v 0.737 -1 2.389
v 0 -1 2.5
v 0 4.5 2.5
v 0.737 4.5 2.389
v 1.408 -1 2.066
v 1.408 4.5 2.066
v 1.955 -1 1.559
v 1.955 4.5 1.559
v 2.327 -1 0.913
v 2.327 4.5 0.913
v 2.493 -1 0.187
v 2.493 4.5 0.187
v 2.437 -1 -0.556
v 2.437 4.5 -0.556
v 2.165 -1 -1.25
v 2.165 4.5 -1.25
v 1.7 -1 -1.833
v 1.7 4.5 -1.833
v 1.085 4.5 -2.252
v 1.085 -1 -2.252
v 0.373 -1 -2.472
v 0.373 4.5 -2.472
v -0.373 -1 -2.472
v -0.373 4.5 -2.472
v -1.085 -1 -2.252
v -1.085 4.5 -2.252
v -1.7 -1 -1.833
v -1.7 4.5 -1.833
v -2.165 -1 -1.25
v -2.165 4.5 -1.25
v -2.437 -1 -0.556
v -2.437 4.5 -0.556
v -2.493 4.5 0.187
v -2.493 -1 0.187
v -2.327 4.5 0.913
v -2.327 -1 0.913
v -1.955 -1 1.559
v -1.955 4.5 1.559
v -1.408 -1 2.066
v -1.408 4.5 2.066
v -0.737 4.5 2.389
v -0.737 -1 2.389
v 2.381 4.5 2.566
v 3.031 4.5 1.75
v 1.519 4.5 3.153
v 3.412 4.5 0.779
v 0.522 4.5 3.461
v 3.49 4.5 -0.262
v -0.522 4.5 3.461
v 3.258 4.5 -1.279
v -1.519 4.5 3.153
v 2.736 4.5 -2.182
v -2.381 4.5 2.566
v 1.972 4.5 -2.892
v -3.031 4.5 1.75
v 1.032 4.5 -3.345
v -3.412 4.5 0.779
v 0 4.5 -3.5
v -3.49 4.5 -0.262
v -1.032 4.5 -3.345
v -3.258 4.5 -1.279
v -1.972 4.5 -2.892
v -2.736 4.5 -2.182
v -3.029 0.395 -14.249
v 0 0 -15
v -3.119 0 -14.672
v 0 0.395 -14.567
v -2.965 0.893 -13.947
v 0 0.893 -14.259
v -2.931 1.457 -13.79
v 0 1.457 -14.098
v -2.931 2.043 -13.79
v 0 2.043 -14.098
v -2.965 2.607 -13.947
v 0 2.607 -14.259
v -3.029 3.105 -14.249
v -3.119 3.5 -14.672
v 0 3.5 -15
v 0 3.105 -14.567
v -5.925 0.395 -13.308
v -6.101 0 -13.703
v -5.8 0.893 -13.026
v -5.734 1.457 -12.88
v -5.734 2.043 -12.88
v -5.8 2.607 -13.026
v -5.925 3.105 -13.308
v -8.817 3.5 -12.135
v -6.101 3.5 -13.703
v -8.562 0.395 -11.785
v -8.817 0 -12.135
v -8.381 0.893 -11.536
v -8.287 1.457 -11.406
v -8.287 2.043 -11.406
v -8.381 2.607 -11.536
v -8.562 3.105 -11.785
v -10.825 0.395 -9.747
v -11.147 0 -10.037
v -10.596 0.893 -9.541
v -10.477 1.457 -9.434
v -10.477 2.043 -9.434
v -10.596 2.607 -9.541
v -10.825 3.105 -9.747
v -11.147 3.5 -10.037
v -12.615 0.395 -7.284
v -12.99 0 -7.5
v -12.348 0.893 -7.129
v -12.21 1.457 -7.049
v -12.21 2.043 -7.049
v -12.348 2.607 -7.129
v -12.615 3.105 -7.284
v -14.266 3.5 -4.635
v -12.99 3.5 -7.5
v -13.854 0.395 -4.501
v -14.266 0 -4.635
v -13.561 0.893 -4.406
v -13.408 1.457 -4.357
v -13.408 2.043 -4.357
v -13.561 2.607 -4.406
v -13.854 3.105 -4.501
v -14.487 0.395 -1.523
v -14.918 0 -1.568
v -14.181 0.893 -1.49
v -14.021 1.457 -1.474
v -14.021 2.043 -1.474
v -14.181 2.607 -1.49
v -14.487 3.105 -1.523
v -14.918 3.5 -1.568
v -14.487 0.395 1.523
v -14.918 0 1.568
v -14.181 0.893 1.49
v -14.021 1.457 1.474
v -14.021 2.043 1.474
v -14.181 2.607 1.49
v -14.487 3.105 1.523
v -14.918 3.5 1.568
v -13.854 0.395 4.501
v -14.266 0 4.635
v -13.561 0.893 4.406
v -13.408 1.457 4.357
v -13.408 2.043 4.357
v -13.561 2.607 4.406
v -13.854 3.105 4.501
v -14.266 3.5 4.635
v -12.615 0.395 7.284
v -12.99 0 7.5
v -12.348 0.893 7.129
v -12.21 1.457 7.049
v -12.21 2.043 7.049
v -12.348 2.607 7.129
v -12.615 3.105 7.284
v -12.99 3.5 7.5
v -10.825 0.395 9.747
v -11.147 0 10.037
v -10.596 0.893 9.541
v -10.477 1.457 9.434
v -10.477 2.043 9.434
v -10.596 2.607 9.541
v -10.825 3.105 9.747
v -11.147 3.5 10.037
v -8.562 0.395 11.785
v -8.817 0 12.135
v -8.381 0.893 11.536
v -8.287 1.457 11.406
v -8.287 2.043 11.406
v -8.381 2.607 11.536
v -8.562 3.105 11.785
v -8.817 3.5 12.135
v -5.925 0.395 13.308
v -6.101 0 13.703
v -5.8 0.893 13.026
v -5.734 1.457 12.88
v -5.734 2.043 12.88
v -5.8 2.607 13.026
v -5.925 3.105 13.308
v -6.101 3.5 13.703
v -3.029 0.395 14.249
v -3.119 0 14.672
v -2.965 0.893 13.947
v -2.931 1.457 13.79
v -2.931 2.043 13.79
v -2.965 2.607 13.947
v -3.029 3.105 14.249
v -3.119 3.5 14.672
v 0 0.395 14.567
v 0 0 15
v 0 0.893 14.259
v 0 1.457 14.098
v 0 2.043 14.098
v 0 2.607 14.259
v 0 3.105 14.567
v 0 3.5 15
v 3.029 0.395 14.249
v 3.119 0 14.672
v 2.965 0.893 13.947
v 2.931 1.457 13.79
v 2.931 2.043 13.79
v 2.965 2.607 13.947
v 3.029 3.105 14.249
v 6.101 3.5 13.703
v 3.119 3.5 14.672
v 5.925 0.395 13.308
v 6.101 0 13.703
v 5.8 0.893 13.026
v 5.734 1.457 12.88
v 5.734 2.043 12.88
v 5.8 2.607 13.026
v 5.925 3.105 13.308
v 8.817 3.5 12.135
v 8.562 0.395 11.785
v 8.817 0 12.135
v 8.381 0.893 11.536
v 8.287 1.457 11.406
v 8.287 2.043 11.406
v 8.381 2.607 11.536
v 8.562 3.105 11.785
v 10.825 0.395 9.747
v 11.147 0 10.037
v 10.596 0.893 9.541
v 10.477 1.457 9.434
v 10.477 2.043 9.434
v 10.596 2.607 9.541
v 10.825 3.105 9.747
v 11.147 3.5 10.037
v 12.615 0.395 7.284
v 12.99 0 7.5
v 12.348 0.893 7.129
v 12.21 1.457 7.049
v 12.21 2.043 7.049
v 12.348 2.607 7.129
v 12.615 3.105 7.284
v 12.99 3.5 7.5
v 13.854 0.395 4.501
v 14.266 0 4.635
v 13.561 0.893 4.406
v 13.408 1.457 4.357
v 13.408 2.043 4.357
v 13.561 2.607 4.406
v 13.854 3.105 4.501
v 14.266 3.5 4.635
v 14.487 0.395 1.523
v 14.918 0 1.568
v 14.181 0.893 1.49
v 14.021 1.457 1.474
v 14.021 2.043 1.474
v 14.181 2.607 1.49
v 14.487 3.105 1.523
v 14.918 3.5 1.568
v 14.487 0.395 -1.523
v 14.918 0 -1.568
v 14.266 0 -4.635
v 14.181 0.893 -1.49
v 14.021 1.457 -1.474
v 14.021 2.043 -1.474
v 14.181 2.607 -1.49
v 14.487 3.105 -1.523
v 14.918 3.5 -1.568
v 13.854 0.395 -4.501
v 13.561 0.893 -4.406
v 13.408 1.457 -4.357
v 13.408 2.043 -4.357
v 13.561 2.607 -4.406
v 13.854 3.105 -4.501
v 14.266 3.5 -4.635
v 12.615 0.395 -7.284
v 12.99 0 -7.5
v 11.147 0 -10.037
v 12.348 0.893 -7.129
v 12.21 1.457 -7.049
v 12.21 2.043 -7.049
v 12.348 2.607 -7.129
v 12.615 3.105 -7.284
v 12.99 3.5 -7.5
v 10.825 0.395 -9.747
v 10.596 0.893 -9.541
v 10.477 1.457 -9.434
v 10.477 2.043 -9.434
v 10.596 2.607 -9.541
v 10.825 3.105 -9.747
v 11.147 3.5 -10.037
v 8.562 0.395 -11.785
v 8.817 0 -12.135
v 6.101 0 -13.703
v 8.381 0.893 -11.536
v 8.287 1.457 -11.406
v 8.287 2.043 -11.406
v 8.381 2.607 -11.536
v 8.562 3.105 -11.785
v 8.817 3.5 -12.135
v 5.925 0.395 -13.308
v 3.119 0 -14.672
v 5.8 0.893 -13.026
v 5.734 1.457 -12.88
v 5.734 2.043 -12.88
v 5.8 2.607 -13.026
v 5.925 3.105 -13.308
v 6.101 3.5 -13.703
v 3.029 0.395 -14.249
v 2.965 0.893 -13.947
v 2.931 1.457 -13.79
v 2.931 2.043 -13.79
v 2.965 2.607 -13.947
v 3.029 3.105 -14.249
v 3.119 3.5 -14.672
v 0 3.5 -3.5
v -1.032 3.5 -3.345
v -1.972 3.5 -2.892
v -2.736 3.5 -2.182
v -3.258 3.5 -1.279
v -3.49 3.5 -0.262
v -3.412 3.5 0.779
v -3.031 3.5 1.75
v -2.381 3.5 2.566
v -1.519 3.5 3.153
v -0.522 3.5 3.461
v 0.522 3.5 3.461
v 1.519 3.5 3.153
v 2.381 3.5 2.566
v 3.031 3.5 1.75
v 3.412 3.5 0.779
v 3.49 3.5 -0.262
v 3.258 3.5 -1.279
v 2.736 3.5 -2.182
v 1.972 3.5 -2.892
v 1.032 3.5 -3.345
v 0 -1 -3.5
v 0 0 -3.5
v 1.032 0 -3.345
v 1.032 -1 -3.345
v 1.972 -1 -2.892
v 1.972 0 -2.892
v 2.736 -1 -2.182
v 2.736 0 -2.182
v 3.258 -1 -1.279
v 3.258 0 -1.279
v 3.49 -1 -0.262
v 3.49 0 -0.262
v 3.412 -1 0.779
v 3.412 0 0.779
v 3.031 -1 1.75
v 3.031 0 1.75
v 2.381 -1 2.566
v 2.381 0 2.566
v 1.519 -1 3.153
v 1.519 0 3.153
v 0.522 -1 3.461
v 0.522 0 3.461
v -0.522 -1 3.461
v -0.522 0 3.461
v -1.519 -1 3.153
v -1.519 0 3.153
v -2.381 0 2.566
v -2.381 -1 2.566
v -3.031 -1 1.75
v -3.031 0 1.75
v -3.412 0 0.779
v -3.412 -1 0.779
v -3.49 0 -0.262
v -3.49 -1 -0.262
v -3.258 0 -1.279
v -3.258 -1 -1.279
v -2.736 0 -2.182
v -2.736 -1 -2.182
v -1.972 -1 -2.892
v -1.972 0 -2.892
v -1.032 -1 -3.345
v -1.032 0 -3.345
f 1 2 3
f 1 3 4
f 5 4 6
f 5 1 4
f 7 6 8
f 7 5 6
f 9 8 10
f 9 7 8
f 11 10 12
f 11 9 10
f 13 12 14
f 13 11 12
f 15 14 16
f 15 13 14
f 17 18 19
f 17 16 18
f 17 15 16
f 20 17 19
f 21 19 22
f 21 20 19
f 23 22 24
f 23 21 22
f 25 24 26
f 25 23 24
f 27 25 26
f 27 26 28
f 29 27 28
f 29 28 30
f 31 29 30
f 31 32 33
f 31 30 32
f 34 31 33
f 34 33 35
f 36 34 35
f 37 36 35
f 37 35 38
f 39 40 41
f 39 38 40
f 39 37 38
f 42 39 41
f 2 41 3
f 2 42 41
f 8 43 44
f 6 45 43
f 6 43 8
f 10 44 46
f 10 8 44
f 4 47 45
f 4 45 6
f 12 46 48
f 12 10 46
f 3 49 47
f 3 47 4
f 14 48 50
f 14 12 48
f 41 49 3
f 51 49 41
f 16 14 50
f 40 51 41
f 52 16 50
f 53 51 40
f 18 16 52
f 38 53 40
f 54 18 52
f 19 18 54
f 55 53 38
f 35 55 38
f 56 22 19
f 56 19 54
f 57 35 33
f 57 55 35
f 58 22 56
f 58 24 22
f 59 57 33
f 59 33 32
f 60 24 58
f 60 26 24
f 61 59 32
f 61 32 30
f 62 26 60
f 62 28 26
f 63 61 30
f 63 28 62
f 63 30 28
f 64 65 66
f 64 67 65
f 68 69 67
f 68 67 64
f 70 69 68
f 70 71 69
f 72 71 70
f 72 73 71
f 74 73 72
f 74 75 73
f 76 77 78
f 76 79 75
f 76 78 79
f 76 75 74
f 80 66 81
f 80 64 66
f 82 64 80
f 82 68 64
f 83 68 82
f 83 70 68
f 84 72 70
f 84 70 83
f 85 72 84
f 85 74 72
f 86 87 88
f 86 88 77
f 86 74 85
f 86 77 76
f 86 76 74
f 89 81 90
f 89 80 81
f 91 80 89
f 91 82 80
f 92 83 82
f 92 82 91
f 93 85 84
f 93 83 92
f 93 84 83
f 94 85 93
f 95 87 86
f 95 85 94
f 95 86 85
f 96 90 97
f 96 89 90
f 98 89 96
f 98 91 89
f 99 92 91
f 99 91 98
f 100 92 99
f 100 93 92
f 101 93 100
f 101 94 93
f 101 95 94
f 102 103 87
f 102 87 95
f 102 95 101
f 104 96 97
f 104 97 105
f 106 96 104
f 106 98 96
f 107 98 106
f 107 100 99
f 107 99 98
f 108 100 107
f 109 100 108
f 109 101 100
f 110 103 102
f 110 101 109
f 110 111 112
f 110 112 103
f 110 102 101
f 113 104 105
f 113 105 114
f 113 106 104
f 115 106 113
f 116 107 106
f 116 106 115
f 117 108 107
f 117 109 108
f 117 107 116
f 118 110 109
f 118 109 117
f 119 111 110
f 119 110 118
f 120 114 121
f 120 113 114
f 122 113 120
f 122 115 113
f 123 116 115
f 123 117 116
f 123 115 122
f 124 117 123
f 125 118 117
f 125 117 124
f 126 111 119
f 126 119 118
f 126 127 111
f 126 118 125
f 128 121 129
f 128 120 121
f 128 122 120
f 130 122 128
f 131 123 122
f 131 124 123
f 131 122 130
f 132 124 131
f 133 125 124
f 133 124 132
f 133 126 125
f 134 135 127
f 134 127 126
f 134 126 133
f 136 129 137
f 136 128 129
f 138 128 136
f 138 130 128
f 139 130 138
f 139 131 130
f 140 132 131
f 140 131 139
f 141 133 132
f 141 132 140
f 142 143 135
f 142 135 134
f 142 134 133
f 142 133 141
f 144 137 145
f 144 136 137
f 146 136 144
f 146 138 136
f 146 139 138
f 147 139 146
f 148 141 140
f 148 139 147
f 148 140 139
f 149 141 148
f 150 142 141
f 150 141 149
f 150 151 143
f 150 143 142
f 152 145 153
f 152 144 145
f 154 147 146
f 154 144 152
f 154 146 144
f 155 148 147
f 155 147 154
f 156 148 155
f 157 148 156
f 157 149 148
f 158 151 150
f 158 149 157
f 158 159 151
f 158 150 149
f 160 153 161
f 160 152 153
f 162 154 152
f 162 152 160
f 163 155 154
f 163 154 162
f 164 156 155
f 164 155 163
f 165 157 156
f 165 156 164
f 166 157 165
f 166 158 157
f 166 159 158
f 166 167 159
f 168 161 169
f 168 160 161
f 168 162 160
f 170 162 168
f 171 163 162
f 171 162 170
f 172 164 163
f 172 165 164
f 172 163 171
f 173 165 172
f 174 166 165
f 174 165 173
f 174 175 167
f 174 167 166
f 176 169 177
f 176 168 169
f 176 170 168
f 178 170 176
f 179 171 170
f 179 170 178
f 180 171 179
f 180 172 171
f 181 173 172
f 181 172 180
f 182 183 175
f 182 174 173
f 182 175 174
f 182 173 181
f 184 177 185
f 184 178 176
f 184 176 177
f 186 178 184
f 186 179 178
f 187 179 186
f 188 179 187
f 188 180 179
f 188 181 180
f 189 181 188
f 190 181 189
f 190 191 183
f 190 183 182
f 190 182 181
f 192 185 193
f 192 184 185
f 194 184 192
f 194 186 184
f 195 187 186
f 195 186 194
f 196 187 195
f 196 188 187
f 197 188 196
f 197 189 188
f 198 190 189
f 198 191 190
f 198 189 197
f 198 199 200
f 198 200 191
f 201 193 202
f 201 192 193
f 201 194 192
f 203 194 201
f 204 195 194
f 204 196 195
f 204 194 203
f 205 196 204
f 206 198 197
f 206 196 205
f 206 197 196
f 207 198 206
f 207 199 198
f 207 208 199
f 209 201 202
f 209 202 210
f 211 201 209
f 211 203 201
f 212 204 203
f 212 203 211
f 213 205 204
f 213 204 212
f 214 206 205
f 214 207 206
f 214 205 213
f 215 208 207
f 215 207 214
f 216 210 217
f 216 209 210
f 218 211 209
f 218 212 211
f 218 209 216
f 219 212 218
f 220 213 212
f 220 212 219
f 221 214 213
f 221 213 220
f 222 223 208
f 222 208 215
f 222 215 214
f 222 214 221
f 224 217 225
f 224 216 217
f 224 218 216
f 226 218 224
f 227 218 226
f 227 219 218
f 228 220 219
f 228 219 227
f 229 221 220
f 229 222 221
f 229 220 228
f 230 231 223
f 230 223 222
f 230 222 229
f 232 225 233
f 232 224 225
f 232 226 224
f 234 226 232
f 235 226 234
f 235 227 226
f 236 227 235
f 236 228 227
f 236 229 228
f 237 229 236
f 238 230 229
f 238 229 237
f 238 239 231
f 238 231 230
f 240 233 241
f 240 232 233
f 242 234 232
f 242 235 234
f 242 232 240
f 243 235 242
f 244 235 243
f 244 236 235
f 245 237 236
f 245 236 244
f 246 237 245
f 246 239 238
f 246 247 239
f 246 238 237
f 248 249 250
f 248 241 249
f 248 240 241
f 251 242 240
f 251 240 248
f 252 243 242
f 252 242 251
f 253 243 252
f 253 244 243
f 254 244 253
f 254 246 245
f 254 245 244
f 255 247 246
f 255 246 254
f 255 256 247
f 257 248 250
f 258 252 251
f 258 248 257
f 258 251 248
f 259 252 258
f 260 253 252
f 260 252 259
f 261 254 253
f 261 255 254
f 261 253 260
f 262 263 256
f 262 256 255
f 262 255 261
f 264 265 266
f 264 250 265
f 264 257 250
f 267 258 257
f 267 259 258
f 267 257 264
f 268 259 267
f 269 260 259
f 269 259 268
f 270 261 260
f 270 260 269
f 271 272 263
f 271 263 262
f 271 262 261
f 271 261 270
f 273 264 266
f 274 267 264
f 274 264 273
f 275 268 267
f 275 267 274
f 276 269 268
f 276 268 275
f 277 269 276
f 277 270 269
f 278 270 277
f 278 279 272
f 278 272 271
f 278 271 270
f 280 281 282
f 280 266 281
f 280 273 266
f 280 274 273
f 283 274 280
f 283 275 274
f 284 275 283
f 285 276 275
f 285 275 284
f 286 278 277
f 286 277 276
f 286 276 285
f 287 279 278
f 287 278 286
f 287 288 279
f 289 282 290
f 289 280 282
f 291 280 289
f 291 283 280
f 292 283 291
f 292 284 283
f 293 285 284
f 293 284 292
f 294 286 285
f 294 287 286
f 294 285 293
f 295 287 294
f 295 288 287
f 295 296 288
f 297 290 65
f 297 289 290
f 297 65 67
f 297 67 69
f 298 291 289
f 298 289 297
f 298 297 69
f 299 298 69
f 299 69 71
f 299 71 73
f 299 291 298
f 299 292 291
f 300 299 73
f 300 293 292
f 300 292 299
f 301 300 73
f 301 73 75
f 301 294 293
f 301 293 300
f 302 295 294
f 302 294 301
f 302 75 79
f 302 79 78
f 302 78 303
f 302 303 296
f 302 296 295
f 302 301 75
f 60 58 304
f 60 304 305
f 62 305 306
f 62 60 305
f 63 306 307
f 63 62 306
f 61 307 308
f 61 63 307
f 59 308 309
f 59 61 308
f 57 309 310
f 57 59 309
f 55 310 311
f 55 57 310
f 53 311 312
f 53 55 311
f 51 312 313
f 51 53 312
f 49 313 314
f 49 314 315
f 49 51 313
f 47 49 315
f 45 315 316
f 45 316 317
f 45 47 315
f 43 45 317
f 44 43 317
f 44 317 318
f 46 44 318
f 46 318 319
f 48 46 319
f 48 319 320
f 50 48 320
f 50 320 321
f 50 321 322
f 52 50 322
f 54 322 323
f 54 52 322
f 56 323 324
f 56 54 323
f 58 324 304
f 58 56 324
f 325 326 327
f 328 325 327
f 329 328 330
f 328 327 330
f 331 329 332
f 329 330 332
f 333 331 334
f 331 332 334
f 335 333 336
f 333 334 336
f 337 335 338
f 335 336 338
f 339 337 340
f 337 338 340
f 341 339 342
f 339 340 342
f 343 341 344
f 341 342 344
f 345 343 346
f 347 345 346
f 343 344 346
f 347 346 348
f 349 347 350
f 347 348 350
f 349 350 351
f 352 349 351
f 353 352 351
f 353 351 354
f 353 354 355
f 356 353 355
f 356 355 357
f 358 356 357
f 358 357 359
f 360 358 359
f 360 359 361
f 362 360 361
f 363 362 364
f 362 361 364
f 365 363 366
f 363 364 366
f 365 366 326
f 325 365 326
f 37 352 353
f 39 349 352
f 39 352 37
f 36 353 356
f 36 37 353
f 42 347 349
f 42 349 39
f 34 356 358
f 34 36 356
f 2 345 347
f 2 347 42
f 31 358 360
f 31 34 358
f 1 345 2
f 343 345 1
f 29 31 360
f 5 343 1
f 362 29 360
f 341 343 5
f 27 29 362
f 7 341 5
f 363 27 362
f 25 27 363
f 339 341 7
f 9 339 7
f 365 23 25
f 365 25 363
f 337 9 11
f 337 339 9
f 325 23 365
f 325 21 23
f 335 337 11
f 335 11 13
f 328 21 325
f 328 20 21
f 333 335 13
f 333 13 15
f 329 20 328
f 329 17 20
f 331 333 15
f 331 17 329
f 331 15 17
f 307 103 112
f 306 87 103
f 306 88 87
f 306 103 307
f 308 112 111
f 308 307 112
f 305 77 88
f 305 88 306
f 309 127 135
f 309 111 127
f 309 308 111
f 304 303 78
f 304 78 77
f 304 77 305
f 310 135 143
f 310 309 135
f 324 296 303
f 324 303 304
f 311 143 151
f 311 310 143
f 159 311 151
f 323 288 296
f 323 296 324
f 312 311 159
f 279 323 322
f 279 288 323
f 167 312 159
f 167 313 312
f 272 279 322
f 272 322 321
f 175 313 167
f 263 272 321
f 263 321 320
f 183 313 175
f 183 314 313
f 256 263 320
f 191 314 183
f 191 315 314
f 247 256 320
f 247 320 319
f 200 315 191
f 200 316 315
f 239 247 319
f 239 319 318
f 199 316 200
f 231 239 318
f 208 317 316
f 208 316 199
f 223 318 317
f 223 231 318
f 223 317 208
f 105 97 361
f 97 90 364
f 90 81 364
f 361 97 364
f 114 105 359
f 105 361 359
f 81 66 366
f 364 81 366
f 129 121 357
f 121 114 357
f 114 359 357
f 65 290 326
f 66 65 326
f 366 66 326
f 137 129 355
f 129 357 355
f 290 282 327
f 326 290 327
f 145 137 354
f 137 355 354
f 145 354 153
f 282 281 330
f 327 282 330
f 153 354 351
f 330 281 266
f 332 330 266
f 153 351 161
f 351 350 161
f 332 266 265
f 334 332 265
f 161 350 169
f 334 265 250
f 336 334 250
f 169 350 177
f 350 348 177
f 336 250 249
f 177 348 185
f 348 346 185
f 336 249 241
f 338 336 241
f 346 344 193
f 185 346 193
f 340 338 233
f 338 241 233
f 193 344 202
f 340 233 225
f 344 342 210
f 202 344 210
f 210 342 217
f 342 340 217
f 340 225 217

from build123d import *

# Parameters (mm, degrees)
SKETCH1_R               = 15
BOSS_EXTRUDE1_DEPTH     = 3.5
SKETCH2_R               = 2.121909517
SKETCH4_R               = 3.5
BOSS_EXTRUDE2_DEPTH     = 1
BOSS_EXTRUDE3_START     = 1
SKETCH5_R               = 3.5
BOSS_EXTRUDE3_DEPTH     = 1
CUT_EXTRUDE1_DEPTH      = 22.685248442
CUT_EXTRUDE1_DEPTH_BACK = 22.685248442
SKETCH3_R               = 2.5


with BuildPart() as part:
    # Sketch1 → Boss-Extrude1 (new body)
    with BuildSketch(Plane(origin=(0, 0, 0), x_dir=(1, 0, 0), z_dir=(0, 1, 0))):
        with Locations(Location((0, 0, 0), (0, 0, 270))):
            Circle(SKETCH1_R)
    extrude(amount=BOSS_EXTRUDE1_DEPTH)

    # Sketch2 → Cut-Revolve1 (revolve, cut)
    with BuildSketch(Plane(origin=(0, 0, 0), x_dir=(0, 0, -1), z_dir=(1, 0, 0)), mode=Mode.PRIVATE) as cut_revolve1_sk:
        with Locations((-16.2, 1.75)):
            Circle(SKETCH2_R)
    revolve(cut_revolve1_sk.sketch.rotate(Axis((0, 0, 0), (0, 1, 0)), 180), axis=Axis((0, 0, 0), (0, 1, 0)), mode=Mode.SUBTRACT)

    # Sketch4 → Boss-Extrude2 (add)
    with BuildSketch(Plane.XZ):
        with Locations(Location((0, 0, 0), (0, 0, 270))):
            Circle(SKETCH4_R)
    extrude(amount=BOSS_EXTRUDE2_DEPTH)

    # Sketch5 → Boss-Extrude3 (add)
    with BuildSketch(Plane(origin=(0, 3.5, 0), x_dir=(1, 0, 0), z_dir=(0, 1, 0)).offset(BOSS_EXTRUDE3_START)):
        with Locations(Location((0, 0, 0), (0, 0, 90))):
            Circle(SKETCH5_R)
    extrude(amount=-BOSS_EXTRUDE3_DEPTH)

    # Sketch3 → Cut-Extrude1 (cut, two sides: drawn at the far end of the back side and taken through both)
    with BuildSketch(Plane(origin=(0, 3.5, 0), x_dir=(1, 0, 0), z_dir=(0, 1, 0)).offset(-CUT_EXTRUDE1_DEPTH_BACK)):
        with Locations(Location((0, 0, 0), (0, 0, 270))):
            Circle(SKETCH3_R)
    extrude(amount=CUT_EXTRUDE1_DEPTH + CUT_EXTRUDE1_DEPTH_BACK, mode=Mode.SUBTRACT)


solid = part.part
